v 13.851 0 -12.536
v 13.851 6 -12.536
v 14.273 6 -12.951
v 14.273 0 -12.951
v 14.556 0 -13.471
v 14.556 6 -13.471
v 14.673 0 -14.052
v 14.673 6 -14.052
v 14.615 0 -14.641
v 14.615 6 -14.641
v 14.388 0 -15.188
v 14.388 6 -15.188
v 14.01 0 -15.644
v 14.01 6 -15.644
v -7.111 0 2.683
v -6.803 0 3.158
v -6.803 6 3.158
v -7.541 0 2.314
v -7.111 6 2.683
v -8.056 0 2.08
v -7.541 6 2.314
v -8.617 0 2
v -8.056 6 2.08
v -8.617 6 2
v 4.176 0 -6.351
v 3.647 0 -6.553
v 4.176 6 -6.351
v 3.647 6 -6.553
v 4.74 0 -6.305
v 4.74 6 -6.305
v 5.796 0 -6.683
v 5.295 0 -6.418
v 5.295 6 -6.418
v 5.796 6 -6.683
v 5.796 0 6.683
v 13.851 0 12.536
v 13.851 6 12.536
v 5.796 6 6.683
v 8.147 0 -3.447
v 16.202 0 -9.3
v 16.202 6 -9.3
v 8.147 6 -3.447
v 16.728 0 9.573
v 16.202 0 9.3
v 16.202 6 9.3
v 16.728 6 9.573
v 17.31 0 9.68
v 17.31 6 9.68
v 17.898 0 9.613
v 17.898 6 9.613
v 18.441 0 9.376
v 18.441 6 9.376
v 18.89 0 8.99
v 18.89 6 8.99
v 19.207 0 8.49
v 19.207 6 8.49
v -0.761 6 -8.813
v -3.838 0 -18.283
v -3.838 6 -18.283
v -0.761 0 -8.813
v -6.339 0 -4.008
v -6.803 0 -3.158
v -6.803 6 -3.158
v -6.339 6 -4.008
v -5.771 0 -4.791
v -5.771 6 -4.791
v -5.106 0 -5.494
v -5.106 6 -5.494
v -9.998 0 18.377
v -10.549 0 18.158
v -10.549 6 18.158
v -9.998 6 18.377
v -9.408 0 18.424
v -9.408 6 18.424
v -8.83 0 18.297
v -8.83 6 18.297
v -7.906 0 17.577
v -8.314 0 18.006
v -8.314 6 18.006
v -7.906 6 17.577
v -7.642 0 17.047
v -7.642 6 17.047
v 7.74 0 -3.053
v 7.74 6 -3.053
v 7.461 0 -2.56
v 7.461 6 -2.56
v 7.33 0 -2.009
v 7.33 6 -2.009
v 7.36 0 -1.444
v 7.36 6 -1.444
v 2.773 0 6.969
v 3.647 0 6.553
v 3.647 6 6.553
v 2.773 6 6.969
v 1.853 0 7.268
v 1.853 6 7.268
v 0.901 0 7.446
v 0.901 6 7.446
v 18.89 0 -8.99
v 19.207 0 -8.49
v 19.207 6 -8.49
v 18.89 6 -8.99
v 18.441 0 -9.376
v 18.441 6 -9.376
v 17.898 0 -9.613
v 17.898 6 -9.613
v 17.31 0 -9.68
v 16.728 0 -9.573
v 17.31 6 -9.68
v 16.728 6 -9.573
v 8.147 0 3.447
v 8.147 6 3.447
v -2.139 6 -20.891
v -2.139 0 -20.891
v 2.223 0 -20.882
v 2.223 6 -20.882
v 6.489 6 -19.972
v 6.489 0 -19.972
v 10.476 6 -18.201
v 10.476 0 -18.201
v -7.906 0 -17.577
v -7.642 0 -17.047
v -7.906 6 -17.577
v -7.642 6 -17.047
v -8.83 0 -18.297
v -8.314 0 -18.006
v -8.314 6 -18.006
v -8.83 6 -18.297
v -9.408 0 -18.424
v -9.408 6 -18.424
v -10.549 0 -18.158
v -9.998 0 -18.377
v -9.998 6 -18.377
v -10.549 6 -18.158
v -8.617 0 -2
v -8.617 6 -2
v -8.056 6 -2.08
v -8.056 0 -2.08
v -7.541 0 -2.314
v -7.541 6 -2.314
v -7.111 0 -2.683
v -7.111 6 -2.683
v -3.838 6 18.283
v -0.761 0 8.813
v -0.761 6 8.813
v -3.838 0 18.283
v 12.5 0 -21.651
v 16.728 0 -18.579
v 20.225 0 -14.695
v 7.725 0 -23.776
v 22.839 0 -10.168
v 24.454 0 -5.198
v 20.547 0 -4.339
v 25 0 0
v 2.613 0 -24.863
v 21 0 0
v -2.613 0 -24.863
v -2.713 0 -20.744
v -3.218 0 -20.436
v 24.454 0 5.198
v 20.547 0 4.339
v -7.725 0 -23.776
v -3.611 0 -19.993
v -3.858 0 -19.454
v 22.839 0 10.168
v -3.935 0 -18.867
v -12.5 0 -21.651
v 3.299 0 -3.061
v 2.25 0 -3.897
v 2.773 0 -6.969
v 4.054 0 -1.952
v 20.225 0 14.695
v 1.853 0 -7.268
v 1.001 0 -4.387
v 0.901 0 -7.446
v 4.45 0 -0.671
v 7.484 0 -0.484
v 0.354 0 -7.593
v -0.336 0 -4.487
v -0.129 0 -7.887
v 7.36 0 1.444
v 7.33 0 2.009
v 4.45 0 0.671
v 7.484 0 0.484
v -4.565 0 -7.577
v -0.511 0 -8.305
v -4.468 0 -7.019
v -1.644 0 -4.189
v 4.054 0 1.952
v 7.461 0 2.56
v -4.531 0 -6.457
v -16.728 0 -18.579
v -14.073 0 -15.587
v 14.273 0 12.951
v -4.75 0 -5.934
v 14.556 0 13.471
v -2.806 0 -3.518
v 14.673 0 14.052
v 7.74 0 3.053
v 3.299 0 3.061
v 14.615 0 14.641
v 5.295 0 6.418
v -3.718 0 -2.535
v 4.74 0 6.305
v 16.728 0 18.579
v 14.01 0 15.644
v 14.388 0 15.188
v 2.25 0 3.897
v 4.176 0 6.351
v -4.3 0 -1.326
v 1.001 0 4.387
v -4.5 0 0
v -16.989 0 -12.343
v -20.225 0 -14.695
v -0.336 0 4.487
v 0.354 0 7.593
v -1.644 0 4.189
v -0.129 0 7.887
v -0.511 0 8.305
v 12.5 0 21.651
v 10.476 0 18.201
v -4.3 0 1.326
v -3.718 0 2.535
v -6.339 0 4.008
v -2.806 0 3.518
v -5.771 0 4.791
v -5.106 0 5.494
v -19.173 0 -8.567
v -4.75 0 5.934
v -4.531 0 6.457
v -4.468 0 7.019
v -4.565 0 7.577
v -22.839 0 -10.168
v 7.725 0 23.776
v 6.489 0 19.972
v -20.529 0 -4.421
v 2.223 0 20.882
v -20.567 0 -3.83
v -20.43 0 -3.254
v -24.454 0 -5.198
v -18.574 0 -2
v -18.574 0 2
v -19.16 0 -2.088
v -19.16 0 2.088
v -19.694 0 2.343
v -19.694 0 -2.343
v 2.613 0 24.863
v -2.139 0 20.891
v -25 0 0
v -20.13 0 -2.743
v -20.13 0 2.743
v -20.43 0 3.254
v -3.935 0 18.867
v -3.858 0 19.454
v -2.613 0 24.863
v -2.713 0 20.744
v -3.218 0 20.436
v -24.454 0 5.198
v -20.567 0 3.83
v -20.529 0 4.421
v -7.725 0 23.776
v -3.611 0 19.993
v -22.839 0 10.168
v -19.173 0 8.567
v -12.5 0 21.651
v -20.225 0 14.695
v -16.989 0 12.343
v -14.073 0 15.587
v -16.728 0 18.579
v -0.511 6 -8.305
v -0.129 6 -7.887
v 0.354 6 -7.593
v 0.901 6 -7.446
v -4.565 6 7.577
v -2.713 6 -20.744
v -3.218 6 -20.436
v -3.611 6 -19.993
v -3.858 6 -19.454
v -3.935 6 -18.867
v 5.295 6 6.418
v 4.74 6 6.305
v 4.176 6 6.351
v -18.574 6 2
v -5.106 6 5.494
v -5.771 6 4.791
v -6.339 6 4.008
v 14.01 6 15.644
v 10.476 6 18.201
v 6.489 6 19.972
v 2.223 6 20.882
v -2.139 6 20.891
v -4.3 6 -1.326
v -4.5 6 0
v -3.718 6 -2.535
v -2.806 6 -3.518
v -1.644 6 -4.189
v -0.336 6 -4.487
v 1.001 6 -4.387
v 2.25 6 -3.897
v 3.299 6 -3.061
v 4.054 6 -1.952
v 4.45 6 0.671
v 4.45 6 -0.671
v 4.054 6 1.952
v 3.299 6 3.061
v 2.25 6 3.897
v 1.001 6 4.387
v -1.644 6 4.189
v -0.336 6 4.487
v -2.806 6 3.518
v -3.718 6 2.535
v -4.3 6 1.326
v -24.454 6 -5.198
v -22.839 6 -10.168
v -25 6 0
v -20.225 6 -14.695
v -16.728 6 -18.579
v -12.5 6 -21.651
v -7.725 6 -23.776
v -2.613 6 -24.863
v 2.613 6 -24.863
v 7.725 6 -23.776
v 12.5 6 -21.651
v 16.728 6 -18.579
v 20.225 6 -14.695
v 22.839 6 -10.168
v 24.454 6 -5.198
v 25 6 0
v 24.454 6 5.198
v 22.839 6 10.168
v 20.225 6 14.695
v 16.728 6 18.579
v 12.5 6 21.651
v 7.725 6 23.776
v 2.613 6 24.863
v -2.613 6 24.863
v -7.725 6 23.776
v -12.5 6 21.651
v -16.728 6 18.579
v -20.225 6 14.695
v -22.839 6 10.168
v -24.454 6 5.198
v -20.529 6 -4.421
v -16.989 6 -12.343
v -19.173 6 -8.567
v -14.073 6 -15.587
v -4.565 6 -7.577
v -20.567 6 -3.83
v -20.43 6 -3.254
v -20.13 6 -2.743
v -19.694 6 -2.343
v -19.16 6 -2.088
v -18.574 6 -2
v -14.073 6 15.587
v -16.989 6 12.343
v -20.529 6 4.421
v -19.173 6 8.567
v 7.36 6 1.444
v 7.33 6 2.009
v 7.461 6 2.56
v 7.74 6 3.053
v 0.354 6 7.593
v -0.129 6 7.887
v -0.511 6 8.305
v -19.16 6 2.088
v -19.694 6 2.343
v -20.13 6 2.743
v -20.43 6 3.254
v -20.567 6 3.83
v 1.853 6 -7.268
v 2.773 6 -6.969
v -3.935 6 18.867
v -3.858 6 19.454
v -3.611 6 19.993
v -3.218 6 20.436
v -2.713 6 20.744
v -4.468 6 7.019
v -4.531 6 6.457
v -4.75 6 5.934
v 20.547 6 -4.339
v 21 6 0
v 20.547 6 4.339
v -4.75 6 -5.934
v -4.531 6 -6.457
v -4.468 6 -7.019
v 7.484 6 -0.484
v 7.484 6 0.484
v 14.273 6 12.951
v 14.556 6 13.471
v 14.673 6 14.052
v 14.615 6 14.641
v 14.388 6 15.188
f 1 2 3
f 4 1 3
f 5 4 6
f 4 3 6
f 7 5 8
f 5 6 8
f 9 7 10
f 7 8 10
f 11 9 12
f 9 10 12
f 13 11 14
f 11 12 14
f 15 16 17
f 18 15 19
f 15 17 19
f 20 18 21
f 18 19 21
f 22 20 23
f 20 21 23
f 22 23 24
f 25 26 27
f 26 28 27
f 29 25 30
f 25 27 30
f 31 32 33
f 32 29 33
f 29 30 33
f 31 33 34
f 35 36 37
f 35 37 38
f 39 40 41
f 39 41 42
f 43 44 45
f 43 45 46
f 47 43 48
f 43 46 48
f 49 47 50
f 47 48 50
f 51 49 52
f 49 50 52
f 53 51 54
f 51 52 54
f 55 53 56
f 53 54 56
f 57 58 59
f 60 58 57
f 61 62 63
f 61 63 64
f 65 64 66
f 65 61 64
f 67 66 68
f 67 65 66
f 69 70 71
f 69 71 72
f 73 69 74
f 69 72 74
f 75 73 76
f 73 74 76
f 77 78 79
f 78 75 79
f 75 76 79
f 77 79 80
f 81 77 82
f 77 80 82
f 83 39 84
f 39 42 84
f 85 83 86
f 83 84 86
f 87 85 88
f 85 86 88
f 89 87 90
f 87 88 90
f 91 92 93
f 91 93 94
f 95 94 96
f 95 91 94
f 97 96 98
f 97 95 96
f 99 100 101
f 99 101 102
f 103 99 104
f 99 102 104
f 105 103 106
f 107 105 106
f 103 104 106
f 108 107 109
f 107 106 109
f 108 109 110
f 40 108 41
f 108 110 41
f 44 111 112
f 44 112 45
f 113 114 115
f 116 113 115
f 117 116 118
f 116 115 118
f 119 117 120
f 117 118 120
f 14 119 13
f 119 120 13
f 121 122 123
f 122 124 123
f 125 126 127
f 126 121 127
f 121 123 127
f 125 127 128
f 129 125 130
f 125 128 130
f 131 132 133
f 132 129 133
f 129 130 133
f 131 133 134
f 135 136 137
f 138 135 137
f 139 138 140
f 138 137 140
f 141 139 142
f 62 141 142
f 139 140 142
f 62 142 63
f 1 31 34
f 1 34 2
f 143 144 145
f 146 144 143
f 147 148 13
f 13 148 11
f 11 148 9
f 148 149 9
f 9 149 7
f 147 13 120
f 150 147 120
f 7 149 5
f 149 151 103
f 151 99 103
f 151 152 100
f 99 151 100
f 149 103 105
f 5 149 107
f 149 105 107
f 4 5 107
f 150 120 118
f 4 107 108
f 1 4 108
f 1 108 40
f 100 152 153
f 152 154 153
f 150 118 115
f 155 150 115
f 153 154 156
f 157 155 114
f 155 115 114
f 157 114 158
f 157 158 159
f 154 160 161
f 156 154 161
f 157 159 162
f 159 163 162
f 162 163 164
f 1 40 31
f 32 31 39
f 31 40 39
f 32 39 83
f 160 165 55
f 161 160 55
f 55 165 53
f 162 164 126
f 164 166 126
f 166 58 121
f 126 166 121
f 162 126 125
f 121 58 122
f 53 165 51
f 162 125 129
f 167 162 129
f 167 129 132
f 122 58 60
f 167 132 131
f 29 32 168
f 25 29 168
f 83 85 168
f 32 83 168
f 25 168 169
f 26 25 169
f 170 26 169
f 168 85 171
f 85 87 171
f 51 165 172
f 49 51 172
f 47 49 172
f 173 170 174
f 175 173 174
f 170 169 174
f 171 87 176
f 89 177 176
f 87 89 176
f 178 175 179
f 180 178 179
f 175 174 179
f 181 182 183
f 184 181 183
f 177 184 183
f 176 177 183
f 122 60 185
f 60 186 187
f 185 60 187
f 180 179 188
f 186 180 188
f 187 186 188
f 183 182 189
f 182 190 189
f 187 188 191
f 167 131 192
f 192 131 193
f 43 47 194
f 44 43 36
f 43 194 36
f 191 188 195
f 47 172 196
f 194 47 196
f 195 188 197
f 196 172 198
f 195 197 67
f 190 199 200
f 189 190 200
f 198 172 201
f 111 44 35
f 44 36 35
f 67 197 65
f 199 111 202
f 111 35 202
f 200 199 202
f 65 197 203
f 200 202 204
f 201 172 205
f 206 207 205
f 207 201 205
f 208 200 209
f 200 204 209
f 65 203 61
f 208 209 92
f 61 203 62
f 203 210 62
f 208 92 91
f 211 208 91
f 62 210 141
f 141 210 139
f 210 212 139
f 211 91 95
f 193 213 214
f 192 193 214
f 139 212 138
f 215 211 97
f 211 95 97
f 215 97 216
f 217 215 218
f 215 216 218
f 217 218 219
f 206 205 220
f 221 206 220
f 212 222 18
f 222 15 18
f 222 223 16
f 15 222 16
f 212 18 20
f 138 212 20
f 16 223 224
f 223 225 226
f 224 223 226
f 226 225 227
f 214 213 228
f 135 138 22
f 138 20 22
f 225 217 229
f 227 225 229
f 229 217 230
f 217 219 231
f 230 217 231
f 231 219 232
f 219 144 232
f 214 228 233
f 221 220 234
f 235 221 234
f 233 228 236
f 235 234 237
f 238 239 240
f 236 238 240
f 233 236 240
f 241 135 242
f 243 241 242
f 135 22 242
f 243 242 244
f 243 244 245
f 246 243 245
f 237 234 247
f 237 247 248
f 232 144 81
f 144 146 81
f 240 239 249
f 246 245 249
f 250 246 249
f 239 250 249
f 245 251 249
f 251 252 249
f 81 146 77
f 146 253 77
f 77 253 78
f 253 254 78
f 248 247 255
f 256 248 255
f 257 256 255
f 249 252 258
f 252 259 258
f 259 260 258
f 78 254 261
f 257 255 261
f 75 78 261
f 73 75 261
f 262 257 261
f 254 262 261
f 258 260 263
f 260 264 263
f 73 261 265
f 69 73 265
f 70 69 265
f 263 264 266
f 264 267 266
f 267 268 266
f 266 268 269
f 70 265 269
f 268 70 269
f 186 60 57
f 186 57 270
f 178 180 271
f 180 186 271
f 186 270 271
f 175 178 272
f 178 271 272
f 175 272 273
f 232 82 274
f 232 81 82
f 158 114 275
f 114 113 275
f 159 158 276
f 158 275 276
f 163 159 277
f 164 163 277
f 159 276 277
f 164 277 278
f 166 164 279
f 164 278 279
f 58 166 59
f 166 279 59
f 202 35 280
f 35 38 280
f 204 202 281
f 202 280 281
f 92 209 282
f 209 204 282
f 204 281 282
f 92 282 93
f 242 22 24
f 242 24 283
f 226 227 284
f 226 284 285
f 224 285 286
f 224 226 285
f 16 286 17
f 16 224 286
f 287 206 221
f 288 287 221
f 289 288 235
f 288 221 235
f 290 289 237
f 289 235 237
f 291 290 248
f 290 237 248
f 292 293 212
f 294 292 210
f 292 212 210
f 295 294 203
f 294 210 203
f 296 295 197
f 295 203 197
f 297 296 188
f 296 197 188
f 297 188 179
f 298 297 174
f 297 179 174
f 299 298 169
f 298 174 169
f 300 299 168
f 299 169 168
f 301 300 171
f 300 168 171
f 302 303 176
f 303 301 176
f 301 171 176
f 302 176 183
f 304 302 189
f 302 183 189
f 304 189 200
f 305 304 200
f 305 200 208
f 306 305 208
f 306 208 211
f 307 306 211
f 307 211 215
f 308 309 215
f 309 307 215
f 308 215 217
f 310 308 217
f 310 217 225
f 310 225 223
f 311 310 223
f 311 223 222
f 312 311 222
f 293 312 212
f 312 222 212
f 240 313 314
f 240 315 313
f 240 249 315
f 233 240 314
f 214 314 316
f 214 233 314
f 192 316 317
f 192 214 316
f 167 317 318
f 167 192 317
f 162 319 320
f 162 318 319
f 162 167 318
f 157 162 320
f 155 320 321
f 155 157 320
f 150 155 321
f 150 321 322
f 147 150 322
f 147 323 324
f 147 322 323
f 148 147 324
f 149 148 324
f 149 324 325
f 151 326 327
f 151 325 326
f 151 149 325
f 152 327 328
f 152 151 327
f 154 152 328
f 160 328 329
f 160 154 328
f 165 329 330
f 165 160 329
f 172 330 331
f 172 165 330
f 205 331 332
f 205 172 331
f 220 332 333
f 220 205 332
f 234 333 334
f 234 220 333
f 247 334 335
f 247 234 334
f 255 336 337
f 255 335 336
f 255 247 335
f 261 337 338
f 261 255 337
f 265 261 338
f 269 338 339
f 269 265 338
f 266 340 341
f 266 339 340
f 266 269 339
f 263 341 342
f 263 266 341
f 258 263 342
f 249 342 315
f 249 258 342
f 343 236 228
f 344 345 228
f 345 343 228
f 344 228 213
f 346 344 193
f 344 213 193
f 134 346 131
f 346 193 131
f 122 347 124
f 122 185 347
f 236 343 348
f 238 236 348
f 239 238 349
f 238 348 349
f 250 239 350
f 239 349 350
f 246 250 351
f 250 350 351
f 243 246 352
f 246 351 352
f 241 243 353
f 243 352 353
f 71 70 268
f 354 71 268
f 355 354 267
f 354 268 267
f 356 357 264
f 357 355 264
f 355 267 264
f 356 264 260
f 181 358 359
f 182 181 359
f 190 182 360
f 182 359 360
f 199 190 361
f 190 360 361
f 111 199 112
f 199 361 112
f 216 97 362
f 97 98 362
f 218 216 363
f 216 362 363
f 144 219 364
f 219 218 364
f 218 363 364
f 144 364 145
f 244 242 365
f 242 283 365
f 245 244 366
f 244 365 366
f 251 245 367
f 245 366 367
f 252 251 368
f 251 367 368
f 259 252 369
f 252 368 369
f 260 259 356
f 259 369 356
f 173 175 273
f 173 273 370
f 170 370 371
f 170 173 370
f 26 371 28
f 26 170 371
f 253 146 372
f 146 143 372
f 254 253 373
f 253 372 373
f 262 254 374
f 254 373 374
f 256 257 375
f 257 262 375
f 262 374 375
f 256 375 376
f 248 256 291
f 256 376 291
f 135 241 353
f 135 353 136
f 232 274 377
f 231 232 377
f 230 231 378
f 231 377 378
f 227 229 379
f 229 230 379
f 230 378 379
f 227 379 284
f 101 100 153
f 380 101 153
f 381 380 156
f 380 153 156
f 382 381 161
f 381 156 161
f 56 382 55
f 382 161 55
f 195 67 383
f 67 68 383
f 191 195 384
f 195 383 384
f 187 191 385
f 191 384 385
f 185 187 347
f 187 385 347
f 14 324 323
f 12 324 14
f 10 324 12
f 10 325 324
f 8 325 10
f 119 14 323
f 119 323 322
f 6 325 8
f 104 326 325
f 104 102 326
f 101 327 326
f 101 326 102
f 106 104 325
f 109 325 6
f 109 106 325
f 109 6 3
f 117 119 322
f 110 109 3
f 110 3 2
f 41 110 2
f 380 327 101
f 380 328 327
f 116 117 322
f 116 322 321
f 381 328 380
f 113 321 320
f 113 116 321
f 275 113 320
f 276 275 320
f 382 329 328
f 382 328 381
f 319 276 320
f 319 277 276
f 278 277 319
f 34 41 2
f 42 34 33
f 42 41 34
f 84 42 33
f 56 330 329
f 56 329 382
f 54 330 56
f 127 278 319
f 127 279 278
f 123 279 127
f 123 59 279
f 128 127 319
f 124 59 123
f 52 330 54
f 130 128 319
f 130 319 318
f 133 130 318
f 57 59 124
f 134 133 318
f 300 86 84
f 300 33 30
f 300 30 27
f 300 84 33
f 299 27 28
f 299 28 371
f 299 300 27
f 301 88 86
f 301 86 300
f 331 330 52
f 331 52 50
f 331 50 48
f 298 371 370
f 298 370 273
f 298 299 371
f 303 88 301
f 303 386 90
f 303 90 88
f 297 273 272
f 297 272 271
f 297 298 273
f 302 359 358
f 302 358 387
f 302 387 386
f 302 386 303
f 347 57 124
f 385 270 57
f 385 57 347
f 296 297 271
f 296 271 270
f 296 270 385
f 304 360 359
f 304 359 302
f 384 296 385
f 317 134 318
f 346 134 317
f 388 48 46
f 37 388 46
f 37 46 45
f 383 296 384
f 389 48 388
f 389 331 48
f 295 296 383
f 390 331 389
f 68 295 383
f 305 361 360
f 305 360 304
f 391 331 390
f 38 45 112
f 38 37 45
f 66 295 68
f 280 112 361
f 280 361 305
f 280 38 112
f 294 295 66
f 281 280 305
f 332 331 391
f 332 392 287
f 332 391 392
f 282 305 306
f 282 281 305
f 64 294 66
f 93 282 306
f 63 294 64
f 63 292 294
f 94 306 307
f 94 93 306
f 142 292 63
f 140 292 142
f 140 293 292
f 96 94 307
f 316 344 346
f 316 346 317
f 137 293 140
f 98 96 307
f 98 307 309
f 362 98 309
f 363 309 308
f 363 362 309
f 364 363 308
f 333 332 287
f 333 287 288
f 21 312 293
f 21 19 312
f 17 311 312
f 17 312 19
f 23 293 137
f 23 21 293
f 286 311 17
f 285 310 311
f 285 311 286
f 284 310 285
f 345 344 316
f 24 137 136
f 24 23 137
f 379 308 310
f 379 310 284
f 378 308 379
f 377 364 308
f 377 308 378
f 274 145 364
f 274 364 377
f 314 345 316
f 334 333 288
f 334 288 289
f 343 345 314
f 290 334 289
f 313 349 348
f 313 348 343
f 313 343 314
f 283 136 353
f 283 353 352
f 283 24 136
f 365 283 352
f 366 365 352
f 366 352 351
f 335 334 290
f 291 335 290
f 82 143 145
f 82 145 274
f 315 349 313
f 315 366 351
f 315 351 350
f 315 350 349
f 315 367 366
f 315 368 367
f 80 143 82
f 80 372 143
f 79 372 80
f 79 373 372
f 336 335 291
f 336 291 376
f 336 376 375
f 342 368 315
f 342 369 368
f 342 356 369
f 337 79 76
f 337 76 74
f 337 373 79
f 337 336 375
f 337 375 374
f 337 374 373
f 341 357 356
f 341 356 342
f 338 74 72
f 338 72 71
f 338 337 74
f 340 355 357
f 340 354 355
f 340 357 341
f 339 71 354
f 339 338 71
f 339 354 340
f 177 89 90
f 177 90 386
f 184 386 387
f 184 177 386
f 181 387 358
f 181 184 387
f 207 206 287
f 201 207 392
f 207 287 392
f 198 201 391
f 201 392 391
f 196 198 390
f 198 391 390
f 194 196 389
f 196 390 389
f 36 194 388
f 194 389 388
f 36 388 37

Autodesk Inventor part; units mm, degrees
ref_plane "YZ Plane" through (0, 0, 0) normal (1, 0, 0) x (0, 1, 0)
ref_plane "XZ Plane" through (0, 0, 0) normal (0, 1, 0) x (-1, 0, 0)
ref_plane "XY Plane" through (0, 0, 0) normal (0, 0, 1) x (1, 0, 0)
sketch "Sketch1" plane through (0, 0, 0) normal (0, 1, 0) x (-1, 0, 0)
  circle A0 centre (0, 0) radius 4.5
  circle A1 centre (0, 0) radius 25
  circle A2 centre (0, 0) radius 7.5
  circle A3 centre (0, 0) radius 21
  line L0 (0, 0) -> (25, 0)
  line L1 (22.5, 2) -> (22.5, -2)
  line L2 (22.5, -2) -> (2.5, -2)
  line L3 (2.5, -2) -> (2.5, 2)
  line L4 (2.5, 2) -> (22.5, 2)
  line L5 (22.5, 2) -> (2.5, -2) construction
  line L6 (22.5, -2) -> (2.5, 2) construction
  line L7 (5.0508, 22.0168) -> (8.855, 20.7807)
  line L8 (-1.1296, 2.9957) -> (5.0508, 22.0168)
  line L9 (8.855, 20.7807) -> (2.6747, 1.7596)
  line L10 (2.6747, 1.7596) -> (-1.1296, 2.9957)
  line L11 (-19.3785, 11.6071) -> (-17.0273, 14.8432)
  line L12 (-3.1981, -0.1486) -> (-19.3785, 11.6071)
  line L13 (-17.0273, 14.8432) -> (-0.847, 3.0875)
  line L14 (-0.847, 3.0875) -> (-3.1981, -0.1486)
  line L15 (-17.0273, -14.8432) -> (-19.3785, -11.6071)
  line L16 (-0.847, -3.0875) -> (-17.0273, -14.8432)
  line L17 (-19.3785, -11.6071) -> (-3.1981, 0.1486)
  line L18 (-3.1981, 0.1486) -> (-0.847, -3.0875)
  line L19 (8.855, -20.7807) -> (5.0508, -22.0168)
  line L20 (2.6747, -1.7596) -> (8.855, -20.7807)
  line L21 (5.0508, -22.0168) -> (-1.1296, -2.9957)
  line L22 (-1.1296, -2.9957) -> (2.6747, -1.7596)
  point P0 (12.5, 0)
  point P1 (7.2284, -2)
  point P2 (20.9045, -2)
  point P3 (8.362, -19.2634)
  point P4 (4.1358, -6.2566)
  point P5 (7.2284, 2)
  point P6 (4.1358, 6.2566)
  point P7 (8.362, 19.2634)
  point P8 (20.9045, 2)
  point P9 (0.3316, 7.4927)
  point P10 (-4.6723, 5.8668)
  point P11 (-15.7366, 13.9054)
  point P12 (4.5577, 20.4994)
  point P13 (-4.6723, -5.8668)
  point P14 (0.3316, -7.4927)
  point P15 (4.5577, -20.4994)
  point P16 (-15.7366, -13.9054)
  point P17 (-7.0235, 2.6307)
  point P18 (-7.0235, -2.6307)
  point P19 (-18.0877, -10.6693)
  point P20 (-18.0877, 10.6693)
  dimension "d1" = 50
  dimension "d0" = 9
  dimension "d2" = 3
  dimension "d3" = 4
  dimension "d4" = 4
  dimension "d5" = 20
  dimension "d8" = 360
extrude "Extrusion1" add sketch "Sketch1" along normal blind 6 contours L0 A2 L2 A0 | A0 L4 A2 L0 | A0 L9 A2 L4 | L2 A2 L20 A0 | L0 A3 L2 A2 | A2 L4 A3 L0 | A0 L8 A2 L9 | L20 A2 L21 A0 | L0 L1 L2 A3 | A3 L4 L1 L0 | A0 L13 A2 L8 | A2 L8 A3 L9 | A1 | L21 A2 L16 A0 | L20 A3 L21 A2 | A0 L12 A2 L13 | A3 L8 L7 L9 | L16 A2 L17 A0 | L20 L19 L21 A3 | A0 L17 A2 L12 | A2 L12 A3 L13 | L16 A3 L17 A2 | A3 L12 L11 L13 | L16 L15 L17 A3
fillet "Fillet1" radius 2 4 edges at (-8.362, 3, 19.2634) (-20.9045, 3, 2) (-7.2284, 3, 2) (-4.1358, 3, 6.2566)
pattern_circular "Circular Pattern1" count 5 over 360 about axis through (0, 0, 0) along (0, 1, 0) of "Fillet1"
properties part number "8_6mm"
